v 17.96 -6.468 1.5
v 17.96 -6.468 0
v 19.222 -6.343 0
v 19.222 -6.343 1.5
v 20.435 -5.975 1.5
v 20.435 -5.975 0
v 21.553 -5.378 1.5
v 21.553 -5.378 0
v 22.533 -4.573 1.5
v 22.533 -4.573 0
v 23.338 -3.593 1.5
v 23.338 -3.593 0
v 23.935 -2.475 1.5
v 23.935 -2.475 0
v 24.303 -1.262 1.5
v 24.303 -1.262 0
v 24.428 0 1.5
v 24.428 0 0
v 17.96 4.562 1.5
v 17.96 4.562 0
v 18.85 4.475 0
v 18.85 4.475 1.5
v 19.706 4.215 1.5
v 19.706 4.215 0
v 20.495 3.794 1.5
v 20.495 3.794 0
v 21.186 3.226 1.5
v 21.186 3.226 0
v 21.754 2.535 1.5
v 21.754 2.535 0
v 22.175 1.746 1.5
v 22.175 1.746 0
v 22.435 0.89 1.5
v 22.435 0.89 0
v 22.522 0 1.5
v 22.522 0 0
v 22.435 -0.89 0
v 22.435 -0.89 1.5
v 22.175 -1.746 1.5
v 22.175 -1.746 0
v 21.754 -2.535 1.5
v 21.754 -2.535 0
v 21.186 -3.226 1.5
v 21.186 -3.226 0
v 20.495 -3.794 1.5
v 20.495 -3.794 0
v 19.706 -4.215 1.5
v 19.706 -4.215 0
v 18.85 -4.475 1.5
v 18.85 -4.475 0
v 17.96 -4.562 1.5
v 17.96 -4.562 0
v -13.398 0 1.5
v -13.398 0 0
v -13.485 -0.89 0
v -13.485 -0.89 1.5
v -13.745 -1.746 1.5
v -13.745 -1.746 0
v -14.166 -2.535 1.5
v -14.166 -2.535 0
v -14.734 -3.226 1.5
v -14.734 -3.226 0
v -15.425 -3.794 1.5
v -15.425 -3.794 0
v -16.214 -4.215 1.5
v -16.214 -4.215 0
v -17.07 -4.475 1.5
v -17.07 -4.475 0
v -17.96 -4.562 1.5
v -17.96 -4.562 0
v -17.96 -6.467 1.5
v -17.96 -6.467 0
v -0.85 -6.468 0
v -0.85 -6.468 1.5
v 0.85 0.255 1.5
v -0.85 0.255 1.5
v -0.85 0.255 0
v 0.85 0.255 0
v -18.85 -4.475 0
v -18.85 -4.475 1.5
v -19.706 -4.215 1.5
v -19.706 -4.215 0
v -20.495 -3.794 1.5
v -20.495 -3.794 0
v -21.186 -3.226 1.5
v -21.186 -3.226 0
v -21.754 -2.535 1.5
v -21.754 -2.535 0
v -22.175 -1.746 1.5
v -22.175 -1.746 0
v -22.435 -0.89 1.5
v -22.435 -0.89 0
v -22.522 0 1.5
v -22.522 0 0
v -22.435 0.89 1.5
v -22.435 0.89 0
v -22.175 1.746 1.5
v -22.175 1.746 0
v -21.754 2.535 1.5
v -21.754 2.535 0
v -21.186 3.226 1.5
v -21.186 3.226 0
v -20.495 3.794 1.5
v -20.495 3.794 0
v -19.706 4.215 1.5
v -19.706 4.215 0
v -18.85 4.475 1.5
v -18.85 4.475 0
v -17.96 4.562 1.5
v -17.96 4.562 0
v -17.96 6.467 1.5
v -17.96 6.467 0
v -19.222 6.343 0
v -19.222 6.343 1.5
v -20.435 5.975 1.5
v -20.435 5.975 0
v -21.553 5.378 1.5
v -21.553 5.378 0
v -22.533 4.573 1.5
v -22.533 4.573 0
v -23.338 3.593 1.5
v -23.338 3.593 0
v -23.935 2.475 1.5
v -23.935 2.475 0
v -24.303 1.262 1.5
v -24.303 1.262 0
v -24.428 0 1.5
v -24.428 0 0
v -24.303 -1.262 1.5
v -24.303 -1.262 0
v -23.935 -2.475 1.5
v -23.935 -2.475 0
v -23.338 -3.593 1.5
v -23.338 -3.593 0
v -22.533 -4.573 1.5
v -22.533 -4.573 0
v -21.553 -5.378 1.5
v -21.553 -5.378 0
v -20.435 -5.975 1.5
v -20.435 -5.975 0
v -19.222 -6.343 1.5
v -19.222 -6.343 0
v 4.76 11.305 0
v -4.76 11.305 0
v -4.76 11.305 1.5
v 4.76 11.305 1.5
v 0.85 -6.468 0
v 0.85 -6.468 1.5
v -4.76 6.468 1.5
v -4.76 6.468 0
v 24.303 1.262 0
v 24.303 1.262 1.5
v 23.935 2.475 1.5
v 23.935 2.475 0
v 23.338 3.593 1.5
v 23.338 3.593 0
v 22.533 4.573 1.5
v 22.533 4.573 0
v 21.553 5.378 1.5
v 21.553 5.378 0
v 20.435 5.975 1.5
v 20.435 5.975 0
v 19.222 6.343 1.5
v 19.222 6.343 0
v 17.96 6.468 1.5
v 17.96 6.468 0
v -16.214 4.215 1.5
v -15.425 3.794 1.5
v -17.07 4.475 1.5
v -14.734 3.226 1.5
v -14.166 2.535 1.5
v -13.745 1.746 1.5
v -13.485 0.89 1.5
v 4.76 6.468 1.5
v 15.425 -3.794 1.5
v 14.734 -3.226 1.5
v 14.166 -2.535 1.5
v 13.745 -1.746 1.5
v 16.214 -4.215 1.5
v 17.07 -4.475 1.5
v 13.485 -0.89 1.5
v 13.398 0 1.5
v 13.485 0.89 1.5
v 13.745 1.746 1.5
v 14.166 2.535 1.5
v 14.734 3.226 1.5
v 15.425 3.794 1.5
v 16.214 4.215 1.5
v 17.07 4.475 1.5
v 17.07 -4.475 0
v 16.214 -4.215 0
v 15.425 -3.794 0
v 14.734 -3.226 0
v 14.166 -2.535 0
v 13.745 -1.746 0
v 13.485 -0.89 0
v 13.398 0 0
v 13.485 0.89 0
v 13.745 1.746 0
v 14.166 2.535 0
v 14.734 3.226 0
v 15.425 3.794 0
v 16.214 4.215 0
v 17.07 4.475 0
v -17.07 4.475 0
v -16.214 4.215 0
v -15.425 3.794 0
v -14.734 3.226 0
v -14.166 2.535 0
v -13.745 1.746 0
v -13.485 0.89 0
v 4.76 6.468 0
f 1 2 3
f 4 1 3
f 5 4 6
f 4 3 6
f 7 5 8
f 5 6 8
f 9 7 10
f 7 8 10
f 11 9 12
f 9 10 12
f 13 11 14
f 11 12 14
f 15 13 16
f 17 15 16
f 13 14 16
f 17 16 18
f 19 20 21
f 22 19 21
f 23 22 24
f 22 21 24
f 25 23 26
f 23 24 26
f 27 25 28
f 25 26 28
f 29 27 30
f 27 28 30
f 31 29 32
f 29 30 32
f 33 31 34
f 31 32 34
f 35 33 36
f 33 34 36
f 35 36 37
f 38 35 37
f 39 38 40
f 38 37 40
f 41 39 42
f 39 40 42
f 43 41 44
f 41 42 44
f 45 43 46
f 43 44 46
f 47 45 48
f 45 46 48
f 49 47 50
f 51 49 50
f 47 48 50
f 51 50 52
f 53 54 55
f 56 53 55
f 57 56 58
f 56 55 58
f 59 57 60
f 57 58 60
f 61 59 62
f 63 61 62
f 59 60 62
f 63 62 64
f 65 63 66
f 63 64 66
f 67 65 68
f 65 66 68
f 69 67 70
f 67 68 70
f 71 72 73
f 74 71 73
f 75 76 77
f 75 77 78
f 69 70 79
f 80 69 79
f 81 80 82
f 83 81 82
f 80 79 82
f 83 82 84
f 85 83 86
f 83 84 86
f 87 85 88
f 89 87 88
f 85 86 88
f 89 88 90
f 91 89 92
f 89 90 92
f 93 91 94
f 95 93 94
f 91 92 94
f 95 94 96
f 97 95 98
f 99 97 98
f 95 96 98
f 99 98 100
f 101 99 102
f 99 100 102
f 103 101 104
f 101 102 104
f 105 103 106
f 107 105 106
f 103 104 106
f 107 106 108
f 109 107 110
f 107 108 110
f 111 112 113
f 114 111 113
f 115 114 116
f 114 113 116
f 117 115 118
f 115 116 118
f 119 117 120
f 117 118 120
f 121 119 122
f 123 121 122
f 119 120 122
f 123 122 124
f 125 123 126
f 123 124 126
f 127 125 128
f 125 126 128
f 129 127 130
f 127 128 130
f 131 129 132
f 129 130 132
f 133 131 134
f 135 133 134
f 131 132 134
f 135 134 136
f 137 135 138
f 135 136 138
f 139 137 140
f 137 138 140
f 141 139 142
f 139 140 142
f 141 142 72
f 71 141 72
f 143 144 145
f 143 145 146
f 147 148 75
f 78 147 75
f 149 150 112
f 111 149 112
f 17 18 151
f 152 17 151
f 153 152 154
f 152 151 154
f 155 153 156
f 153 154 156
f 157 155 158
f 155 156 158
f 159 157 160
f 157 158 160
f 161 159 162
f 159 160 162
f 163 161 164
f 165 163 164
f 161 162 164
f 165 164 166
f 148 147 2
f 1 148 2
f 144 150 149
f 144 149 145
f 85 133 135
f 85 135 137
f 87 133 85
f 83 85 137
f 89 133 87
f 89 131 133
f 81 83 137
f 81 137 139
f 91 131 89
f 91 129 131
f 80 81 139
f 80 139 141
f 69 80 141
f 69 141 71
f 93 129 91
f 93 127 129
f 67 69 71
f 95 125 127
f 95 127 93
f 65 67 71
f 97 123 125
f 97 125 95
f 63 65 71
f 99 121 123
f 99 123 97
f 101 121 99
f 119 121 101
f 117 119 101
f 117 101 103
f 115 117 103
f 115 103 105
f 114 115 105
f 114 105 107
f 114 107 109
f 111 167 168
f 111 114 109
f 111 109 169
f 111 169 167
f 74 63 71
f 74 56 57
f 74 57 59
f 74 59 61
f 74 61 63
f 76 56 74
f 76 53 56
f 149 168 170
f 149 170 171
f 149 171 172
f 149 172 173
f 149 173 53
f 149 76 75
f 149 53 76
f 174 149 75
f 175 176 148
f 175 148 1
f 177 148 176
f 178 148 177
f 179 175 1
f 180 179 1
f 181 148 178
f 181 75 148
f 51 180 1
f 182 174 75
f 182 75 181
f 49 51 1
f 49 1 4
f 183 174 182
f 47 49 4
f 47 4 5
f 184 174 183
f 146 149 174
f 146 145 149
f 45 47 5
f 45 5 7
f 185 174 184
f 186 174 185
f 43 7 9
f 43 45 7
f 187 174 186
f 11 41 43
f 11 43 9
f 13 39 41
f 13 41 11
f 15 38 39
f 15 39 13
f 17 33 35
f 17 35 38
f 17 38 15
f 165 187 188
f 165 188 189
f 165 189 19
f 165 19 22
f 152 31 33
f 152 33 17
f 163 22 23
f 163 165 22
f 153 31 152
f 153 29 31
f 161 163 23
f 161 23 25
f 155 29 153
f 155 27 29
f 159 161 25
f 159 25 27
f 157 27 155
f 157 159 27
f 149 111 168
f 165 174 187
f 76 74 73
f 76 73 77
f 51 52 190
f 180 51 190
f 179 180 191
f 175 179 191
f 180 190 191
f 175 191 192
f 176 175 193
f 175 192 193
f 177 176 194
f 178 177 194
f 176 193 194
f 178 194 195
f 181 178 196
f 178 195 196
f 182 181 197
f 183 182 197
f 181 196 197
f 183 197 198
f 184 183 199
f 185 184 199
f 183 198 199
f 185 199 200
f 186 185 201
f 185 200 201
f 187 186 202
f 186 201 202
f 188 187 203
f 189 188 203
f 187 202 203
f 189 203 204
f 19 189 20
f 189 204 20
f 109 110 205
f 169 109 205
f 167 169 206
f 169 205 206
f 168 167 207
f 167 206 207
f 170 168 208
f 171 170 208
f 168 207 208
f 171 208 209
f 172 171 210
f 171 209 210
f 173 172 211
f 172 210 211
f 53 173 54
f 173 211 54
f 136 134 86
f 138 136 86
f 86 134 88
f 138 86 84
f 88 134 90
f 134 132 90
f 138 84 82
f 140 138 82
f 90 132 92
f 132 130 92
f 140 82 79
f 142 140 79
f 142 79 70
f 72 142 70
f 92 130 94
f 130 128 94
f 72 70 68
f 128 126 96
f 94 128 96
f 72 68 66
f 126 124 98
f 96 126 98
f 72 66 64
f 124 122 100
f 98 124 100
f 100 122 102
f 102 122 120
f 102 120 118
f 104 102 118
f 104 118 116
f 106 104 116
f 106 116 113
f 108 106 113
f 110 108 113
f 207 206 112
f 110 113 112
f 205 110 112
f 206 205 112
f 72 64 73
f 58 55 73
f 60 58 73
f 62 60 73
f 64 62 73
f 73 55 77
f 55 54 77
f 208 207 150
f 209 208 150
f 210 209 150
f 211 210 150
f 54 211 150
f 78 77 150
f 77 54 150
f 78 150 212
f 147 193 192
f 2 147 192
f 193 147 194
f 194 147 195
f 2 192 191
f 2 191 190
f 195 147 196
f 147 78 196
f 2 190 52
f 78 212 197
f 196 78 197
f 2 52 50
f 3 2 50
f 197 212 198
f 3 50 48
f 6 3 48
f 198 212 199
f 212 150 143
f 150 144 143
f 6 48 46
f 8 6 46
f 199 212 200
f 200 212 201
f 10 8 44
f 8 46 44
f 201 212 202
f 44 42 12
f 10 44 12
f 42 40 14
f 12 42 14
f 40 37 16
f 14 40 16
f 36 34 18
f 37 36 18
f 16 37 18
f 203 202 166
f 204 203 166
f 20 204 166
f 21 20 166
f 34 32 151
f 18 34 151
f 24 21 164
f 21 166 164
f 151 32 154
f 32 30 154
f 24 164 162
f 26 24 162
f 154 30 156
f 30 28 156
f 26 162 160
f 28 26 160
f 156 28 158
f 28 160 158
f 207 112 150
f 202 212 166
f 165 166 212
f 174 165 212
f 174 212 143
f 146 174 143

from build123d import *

# Parameters (mm, degrees)
F0_W     = 9.52
F0_H     = 4.8375
F1_DEPTH = 1.5
F2_W     = 1.7
F2_H     = 6.7225
F3_DEPTH = 1.501


with BuildPart() as f1:
    # F0 (on Top) → F1 (new body)
    with BuildSketch(Plane.XY):
        with Locations((0, 8.88625)):
            Rectangle(F0_W, F0_H)
        with BuildLine():
            ThreePointArc((17.96, -4.5625), (13.3975, 0), (17.96, 4.5625))
            Line((17.96, 4.5625), (17.96, 6.4675))
            ThreePointArc((17.96, 6.4675), (11.4925, 0), (17.96, -6.4675))
            Line((17.96, -6.4675), (17.96, -4.5625))
        make_face()
        with BuildLine():
            Line((-17.96, -4.5625), (-17.96, -6.4675))
            ThreePointArc((-17.96, -6.4675), (-13.386787, -4.573213), (-11.4925, 0))
            ThreePointArc((-11.4925, 0), (-13.386787, 4.573213), (-17.96, 6.4675))
            Line((-17.96, 6.4675), (-17.96, 4.5625))
            ThreePointArc((-17.96, 4.5625), (-14.733825, 3.226175), (-13.3975, 0))
            ThreePointArc((-13.3975, 0), (-14.733825, -3.226175), (-17.96, -4.5625))
        make_face()
        with BuildLine():
            ThreePointArc((17.96, 4.5625), (21.186175, 3.226175), (22.5225, 0))
            ThreePointArc((22.5225, 0), (21.186175, -3.226175), (17.96, -4.5625))
            Line((17.96, -4.5625), (17.96, -6.4675))
            ThreePointArc((17.96, -6.4675), (22.533213, -4.573213), (24.4275, 0))
            ThreePointArc((24.4275, 0), (22.533213, 4.573213), (17.96, 6.4675))
            Line((17.96, 6.4675), (17.96, 4.5625))
        make_face()
        with BuildLine():
            ThreePointArc((-17.96, 6.4675), (-24.4275, 0), (-17.96, -6.4675))
            Line((-17.96, -6.4675), (-17.96, -4.5625))
            ThreePointArc((-17.96, -4.5625), (-22.5225, 0), (-17.96, 4.5625))
            Line((-17.96, 4.5625), (-17.96, 6.4675))
        make_face()
        with BuildLine():
            ThreePointArc((17.96, -6.4675), (11.4925, 0), (17.96, 6.4675))
            Line((17.96, 6.4675), (4.76, 6.4675))
            Line((4.76, 6.4675), (-4.76, 6.4675))
            Line((-4.76, 6.4675), (-17.96, 6.4675))
            ThreePointArc((-17.96, 6.4675), (-13.386787, 4.573213), (-11.4925, 0))
            ThreePointArc((-11.4925, 0), (-13.386787, -4.573213), (-17.96, -6.4675))
            Line((-17.96, -6.4675), (17.96, -6.4675))
        make_face()
    extrude(amount=F1_DEPTH)

    # F2 (on face) → F3 (cut, through all)
    with BuildSketch(Plane.XY.offset(1.5)):
        with Locations((0, -3.10625)):
            Rectangle(F2_W, F2_H)
    extrude(amount=-F3_DEPTH, mode=Mode.SUBTRACT)


solid = f1.part
